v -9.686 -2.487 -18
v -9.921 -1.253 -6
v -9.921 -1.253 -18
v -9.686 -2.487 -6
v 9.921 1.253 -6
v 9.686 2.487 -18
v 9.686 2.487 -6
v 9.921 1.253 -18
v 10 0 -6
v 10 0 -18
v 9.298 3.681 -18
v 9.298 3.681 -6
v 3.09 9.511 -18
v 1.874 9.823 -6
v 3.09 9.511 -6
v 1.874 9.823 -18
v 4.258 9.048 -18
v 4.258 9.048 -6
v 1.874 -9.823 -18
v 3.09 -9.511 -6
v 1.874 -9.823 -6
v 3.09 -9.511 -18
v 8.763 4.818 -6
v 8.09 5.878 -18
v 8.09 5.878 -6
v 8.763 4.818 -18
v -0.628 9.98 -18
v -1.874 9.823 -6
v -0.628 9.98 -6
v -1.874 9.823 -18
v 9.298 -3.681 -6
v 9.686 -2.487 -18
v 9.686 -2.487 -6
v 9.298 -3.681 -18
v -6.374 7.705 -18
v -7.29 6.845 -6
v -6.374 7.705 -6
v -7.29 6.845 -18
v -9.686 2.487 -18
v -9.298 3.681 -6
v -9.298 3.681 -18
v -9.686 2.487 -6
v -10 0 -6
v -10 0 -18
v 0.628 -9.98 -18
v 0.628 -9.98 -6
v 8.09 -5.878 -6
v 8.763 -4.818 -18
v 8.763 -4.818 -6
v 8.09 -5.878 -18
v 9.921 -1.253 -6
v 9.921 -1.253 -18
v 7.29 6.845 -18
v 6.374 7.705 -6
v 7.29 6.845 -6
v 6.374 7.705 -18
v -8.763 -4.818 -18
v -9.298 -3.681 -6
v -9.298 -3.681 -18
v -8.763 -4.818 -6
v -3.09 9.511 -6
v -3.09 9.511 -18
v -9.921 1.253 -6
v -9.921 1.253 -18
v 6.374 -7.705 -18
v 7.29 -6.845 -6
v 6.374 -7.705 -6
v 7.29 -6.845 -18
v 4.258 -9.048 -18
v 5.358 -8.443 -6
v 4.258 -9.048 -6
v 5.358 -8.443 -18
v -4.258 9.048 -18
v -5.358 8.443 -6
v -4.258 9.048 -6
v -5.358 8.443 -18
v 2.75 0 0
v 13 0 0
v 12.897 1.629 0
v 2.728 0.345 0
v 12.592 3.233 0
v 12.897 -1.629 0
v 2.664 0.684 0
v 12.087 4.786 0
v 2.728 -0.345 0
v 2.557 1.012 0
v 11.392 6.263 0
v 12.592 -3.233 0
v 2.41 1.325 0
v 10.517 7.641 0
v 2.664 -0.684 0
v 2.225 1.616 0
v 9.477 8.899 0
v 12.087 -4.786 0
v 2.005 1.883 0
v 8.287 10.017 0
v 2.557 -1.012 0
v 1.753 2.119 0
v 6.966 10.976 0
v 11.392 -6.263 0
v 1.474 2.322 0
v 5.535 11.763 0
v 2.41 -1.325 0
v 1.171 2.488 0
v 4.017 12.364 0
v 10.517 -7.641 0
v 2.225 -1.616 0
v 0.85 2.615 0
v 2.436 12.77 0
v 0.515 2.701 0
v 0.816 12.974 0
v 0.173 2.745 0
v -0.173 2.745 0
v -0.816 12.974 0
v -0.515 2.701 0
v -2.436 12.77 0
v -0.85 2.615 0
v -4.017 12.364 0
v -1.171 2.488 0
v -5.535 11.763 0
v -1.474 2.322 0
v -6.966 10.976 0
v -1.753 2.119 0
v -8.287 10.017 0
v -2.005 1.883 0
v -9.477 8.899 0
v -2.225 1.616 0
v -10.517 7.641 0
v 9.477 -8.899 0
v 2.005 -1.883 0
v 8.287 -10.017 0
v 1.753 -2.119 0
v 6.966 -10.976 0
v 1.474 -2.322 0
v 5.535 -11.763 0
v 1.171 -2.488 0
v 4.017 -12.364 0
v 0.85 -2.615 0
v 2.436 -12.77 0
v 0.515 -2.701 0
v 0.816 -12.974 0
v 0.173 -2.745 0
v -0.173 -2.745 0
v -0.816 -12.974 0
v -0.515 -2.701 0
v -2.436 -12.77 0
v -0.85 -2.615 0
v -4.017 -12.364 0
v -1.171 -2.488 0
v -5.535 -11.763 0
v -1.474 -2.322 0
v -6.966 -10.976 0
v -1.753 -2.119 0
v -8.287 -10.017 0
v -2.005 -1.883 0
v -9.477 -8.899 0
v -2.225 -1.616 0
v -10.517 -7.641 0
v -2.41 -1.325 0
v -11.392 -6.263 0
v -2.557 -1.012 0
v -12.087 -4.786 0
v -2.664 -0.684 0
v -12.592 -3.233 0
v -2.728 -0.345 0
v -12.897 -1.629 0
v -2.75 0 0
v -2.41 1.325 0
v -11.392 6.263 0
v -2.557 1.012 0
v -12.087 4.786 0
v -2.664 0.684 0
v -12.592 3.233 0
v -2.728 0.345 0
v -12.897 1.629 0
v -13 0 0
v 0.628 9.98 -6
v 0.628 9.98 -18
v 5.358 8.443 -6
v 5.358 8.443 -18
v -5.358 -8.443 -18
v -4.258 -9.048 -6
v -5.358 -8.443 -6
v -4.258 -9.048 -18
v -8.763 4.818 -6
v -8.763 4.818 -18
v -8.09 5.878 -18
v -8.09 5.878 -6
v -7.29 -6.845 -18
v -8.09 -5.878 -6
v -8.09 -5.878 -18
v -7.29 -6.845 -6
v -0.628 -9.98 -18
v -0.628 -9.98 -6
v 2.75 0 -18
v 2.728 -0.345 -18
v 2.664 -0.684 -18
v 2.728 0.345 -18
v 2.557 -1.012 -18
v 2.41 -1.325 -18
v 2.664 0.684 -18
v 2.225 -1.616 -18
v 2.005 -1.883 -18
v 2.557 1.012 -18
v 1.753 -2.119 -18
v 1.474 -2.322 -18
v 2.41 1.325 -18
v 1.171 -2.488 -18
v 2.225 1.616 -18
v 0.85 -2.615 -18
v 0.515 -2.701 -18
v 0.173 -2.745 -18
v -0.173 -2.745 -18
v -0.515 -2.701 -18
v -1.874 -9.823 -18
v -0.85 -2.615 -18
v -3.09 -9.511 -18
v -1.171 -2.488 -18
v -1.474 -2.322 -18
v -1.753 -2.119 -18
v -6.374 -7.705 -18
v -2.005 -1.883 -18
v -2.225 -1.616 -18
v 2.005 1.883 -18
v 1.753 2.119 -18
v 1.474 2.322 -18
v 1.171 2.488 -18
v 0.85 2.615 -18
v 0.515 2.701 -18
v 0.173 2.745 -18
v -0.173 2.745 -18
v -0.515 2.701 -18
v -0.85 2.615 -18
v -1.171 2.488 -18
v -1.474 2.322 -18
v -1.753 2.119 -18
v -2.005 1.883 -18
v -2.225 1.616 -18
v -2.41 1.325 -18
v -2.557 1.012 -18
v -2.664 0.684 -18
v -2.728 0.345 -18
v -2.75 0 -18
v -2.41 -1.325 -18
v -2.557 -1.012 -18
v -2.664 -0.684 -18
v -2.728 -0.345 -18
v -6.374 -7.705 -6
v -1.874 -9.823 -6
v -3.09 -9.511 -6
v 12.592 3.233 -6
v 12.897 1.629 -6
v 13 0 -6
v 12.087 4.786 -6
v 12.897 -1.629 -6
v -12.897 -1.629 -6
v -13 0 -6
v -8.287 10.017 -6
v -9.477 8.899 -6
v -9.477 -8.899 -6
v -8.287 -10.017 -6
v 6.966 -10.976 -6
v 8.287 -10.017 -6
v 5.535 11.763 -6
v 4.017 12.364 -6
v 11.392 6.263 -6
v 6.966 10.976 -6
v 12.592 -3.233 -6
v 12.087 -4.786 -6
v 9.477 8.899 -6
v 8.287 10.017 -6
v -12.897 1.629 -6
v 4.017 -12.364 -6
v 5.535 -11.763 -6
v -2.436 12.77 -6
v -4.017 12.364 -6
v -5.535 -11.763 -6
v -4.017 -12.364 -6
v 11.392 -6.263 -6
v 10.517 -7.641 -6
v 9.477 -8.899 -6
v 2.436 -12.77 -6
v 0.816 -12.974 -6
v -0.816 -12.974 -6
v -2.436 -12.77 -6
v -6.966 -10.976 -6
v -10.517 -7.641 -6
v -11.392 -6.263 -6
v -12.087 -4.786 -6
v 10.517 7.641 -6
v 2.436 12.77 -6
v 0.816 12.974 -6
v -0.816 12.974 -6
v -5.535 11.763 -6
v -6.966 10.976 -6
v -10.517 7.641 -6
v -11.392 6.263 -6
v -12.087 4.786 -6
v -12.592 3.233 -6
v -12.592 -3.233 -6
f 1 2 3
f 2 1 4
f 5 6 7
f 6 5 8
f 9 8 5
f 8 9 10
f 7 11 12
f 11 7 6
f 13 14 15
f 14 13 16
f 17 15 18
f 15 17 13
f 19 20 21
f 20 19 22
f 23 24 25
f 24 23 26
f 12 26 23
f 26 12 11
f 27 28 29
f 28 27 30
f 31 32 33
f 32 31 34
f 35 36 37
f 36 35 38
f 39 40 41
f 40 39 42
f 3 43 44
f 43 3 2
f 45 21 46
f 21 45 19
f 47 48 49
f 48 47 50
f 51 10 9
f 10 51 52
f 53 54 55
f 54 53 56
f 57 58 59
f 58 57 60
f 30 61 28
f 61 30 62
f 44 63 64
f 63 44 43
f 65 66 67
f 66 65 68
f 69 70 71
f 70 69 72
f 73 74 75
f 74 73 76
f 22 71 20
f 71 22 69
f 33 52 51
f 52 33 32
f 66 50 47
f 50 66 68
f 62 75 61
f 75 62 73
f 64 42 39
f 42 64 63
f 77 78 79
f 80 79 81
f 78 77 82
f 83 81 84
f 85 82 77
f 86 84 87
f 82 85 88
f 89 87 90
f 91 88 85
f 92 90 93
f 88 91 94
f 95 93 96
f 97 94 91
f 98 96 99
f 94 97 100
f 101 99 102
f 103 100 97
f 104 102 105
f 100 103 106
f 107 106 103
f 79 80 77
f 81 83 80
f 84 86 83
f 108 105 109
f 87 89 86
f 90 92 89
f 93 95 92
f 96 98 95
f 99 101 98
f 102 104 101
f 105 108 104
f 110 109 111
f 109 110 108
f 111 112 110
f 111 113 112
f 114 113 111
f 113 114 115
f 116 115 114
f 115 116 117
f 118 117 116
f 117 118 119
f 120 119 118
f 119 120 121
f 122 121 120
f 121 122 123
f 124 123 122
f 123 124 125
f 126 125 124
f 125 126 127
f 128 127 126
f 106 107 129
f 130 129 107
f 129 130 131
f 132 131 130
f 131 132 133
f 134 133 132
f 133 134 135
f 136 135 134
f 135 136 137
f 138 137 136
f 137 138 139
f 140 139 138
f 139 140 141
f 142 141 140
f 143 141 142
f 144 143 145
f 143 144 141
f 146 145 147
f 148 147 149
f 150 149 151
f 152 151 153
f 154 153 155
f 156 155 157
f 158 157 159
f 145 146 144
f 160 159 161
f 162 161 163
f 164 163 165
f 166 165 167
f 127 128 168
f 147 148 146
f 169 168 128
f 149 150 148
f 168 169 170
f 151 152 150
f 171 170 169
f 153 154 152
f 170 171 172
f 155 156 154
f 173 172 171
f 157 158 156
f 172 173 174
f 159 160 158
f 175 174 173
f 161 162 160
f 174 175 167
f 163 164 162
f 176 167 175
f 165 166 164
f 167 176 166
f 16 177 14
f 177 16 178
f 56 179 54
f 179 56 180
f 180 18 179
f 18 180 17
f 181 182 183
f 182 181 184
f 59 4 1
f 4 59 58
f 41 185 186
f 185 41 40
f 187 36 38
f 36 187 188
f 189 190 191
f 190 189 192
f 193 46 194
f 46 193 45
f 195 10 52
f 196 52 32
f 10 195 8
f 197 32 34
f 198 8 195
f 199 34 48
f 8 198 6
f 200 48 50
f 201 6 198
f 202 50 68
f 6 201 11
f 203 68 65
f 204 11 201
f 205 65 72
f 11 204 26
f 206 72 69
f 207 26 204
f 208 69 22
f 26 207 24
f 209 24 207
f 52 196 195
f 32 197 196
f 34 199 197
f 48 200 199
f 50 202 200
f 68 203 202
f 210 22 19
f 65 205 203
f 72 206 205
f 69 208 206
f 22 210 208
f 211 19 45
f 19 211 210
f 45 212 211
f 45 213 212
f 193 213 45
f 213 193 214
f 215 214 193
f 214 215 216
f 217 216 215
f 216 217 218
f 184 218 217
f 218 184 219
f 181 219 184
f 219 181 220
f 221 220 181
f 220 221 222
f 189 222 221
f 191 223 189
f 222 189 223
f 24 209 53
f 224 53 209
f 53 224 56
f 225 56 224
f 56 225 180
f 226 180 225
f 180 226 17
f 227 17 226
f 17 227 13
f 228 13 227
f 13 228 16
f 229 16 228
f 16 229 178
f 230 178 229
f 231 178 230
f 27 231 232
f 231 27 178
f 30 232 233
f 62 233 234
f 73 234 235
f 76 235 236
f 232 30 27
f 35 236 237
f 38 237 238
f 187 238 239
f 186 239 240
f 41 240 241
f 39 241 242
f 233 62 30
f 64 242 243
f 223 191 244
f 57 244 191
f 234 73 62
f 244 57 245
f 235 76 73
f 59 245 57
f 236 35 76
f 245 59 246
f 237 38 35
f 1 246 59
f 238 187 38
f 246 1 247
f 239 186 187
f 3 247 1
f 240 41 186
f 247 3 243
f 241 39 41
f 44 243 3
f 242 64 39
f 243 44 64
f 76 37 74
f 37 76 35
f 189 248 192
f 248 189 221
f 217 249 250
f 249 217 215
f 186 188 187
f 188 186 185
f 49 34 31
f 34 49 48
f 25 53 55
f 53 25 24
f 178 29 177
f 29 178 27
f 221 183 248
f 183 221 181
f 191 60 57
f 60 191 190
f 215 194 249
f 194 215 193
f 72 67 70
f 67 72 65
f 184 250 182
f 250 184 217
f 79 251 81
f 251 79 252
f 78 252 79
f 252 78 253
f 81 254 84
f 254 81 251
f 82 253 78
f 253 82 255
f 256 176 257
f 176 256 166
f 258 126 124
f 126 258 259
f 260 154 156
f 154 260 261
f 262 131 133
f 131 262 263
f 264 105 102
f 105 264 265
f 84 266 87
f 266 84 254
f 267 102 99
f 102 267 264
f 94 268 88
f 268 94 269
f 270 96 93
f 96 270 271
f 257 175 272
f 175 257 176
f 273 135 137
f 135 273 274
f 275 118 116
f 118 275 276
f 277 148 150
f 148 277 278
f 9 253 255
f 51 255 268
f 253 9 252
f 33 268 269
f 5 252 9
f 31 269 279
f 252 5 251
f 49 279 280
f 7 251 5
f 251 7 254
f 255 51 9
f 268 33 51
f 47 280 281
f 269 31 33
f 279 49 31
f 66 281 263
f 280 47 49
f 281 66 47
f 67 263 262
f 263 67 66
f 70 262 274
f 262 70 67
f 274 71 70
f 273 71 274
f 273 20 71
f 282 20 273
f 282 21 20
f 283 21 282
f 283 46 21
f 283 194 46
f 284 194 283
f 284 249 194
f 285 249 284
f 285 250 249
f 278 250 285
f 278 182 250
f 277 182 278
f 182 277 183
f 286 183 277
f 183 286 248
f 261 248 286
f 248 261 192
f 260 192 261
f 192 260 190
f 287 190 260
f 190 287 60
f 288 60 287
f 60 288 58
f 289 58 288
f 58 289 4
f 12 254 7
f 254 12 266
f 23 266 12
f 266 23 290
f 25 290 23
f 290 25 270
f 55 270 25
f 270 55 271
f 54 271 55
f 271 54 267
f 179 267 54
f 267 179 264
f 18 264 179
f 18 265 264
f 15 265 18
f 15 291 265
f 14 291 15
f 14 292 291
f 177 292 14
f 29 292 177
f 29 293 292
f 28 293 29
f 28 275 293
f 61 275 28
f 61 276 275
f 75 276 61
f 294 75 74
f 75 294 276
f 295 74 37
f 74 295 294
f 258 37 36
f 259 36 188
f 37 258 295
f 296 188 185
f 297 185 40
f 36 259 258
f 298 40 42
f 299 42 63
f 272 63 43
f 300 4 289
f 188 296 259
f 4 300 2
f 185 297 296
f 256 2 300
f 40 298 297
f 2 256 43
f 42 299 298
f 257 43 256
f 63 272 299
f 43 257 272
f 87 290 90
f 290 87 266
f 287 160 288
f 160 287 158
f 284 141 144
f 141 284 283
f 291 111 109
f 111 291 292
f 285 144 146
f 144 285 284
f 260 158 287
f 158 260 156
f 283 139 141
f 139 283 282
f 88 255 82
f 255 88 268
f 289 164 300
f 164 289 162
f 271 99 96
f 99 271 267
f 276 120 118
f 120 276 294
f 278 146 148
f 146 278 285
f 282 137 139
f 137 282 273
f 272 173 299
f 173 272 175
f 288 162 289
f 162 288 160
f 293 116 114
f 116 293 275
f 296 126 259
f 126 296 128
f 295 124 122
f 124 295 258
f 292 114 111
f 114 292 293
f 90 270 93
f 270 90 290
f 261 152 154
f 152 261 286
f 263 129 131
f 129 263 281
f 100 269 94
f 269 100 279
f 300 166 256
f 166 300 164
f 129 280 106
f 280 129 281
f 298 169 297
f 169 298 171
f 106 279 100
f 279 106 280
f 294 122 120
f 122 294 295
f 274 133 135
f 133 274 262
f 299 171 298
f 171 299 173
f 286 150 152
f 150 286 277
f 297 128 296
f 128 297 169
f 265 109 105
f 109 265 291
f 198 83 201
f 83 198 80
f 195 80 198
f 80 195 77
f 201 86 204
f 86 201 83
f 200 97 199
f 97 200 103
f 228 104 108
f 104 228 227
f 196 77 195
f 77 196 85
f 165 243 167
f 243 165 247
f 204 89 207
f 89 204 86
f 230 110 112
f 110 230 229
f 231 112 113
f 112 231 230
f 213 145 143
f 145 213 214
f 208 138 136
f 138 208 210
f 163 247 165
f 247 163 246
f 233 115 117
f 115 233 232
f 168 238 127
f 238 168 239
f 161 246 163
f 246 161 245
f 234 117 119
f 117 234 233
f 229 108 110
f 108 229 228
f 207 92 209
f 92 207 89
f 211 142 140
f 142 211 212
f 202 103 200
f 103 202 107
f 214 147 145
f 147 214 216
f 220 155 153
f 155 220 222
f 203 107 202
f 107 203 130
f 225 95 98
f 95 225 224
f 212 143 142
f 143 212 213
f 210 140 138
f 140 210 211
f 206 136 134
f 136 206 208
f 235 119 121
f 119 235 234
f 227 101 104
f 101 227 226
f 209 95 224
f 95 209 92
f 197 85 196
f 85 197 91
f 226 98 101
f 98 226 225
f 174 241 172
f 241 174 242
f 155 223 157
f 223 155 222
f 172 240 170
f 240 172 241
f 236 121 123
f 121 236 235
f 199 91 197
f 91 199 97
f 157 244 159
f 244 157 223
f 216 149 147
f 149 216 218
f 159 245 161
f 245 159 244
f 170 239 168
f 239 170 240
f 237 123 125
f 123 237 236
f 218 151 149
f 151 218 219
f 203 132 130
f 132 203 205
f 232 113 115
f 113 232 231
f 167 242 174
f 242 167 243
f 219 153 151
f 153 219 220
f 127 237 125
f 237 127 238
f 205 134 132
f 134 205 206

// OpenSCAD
$fn = 50;


difference() {
	union() {
		translate(v = [0, 0, -18.0000000000]) {
			cylinder(h = 18, r = 10.0000000000);
		}
		translate(v = [0, 0, -6.0000000000]) {
			cylinder(h = 6, r = 13.0000000000);
		}
	}
	union() {
		#translate(v = [0, 0, -18]) {
			cylinder(h = 18, r = 2.7500000000);
		}
	}
}
